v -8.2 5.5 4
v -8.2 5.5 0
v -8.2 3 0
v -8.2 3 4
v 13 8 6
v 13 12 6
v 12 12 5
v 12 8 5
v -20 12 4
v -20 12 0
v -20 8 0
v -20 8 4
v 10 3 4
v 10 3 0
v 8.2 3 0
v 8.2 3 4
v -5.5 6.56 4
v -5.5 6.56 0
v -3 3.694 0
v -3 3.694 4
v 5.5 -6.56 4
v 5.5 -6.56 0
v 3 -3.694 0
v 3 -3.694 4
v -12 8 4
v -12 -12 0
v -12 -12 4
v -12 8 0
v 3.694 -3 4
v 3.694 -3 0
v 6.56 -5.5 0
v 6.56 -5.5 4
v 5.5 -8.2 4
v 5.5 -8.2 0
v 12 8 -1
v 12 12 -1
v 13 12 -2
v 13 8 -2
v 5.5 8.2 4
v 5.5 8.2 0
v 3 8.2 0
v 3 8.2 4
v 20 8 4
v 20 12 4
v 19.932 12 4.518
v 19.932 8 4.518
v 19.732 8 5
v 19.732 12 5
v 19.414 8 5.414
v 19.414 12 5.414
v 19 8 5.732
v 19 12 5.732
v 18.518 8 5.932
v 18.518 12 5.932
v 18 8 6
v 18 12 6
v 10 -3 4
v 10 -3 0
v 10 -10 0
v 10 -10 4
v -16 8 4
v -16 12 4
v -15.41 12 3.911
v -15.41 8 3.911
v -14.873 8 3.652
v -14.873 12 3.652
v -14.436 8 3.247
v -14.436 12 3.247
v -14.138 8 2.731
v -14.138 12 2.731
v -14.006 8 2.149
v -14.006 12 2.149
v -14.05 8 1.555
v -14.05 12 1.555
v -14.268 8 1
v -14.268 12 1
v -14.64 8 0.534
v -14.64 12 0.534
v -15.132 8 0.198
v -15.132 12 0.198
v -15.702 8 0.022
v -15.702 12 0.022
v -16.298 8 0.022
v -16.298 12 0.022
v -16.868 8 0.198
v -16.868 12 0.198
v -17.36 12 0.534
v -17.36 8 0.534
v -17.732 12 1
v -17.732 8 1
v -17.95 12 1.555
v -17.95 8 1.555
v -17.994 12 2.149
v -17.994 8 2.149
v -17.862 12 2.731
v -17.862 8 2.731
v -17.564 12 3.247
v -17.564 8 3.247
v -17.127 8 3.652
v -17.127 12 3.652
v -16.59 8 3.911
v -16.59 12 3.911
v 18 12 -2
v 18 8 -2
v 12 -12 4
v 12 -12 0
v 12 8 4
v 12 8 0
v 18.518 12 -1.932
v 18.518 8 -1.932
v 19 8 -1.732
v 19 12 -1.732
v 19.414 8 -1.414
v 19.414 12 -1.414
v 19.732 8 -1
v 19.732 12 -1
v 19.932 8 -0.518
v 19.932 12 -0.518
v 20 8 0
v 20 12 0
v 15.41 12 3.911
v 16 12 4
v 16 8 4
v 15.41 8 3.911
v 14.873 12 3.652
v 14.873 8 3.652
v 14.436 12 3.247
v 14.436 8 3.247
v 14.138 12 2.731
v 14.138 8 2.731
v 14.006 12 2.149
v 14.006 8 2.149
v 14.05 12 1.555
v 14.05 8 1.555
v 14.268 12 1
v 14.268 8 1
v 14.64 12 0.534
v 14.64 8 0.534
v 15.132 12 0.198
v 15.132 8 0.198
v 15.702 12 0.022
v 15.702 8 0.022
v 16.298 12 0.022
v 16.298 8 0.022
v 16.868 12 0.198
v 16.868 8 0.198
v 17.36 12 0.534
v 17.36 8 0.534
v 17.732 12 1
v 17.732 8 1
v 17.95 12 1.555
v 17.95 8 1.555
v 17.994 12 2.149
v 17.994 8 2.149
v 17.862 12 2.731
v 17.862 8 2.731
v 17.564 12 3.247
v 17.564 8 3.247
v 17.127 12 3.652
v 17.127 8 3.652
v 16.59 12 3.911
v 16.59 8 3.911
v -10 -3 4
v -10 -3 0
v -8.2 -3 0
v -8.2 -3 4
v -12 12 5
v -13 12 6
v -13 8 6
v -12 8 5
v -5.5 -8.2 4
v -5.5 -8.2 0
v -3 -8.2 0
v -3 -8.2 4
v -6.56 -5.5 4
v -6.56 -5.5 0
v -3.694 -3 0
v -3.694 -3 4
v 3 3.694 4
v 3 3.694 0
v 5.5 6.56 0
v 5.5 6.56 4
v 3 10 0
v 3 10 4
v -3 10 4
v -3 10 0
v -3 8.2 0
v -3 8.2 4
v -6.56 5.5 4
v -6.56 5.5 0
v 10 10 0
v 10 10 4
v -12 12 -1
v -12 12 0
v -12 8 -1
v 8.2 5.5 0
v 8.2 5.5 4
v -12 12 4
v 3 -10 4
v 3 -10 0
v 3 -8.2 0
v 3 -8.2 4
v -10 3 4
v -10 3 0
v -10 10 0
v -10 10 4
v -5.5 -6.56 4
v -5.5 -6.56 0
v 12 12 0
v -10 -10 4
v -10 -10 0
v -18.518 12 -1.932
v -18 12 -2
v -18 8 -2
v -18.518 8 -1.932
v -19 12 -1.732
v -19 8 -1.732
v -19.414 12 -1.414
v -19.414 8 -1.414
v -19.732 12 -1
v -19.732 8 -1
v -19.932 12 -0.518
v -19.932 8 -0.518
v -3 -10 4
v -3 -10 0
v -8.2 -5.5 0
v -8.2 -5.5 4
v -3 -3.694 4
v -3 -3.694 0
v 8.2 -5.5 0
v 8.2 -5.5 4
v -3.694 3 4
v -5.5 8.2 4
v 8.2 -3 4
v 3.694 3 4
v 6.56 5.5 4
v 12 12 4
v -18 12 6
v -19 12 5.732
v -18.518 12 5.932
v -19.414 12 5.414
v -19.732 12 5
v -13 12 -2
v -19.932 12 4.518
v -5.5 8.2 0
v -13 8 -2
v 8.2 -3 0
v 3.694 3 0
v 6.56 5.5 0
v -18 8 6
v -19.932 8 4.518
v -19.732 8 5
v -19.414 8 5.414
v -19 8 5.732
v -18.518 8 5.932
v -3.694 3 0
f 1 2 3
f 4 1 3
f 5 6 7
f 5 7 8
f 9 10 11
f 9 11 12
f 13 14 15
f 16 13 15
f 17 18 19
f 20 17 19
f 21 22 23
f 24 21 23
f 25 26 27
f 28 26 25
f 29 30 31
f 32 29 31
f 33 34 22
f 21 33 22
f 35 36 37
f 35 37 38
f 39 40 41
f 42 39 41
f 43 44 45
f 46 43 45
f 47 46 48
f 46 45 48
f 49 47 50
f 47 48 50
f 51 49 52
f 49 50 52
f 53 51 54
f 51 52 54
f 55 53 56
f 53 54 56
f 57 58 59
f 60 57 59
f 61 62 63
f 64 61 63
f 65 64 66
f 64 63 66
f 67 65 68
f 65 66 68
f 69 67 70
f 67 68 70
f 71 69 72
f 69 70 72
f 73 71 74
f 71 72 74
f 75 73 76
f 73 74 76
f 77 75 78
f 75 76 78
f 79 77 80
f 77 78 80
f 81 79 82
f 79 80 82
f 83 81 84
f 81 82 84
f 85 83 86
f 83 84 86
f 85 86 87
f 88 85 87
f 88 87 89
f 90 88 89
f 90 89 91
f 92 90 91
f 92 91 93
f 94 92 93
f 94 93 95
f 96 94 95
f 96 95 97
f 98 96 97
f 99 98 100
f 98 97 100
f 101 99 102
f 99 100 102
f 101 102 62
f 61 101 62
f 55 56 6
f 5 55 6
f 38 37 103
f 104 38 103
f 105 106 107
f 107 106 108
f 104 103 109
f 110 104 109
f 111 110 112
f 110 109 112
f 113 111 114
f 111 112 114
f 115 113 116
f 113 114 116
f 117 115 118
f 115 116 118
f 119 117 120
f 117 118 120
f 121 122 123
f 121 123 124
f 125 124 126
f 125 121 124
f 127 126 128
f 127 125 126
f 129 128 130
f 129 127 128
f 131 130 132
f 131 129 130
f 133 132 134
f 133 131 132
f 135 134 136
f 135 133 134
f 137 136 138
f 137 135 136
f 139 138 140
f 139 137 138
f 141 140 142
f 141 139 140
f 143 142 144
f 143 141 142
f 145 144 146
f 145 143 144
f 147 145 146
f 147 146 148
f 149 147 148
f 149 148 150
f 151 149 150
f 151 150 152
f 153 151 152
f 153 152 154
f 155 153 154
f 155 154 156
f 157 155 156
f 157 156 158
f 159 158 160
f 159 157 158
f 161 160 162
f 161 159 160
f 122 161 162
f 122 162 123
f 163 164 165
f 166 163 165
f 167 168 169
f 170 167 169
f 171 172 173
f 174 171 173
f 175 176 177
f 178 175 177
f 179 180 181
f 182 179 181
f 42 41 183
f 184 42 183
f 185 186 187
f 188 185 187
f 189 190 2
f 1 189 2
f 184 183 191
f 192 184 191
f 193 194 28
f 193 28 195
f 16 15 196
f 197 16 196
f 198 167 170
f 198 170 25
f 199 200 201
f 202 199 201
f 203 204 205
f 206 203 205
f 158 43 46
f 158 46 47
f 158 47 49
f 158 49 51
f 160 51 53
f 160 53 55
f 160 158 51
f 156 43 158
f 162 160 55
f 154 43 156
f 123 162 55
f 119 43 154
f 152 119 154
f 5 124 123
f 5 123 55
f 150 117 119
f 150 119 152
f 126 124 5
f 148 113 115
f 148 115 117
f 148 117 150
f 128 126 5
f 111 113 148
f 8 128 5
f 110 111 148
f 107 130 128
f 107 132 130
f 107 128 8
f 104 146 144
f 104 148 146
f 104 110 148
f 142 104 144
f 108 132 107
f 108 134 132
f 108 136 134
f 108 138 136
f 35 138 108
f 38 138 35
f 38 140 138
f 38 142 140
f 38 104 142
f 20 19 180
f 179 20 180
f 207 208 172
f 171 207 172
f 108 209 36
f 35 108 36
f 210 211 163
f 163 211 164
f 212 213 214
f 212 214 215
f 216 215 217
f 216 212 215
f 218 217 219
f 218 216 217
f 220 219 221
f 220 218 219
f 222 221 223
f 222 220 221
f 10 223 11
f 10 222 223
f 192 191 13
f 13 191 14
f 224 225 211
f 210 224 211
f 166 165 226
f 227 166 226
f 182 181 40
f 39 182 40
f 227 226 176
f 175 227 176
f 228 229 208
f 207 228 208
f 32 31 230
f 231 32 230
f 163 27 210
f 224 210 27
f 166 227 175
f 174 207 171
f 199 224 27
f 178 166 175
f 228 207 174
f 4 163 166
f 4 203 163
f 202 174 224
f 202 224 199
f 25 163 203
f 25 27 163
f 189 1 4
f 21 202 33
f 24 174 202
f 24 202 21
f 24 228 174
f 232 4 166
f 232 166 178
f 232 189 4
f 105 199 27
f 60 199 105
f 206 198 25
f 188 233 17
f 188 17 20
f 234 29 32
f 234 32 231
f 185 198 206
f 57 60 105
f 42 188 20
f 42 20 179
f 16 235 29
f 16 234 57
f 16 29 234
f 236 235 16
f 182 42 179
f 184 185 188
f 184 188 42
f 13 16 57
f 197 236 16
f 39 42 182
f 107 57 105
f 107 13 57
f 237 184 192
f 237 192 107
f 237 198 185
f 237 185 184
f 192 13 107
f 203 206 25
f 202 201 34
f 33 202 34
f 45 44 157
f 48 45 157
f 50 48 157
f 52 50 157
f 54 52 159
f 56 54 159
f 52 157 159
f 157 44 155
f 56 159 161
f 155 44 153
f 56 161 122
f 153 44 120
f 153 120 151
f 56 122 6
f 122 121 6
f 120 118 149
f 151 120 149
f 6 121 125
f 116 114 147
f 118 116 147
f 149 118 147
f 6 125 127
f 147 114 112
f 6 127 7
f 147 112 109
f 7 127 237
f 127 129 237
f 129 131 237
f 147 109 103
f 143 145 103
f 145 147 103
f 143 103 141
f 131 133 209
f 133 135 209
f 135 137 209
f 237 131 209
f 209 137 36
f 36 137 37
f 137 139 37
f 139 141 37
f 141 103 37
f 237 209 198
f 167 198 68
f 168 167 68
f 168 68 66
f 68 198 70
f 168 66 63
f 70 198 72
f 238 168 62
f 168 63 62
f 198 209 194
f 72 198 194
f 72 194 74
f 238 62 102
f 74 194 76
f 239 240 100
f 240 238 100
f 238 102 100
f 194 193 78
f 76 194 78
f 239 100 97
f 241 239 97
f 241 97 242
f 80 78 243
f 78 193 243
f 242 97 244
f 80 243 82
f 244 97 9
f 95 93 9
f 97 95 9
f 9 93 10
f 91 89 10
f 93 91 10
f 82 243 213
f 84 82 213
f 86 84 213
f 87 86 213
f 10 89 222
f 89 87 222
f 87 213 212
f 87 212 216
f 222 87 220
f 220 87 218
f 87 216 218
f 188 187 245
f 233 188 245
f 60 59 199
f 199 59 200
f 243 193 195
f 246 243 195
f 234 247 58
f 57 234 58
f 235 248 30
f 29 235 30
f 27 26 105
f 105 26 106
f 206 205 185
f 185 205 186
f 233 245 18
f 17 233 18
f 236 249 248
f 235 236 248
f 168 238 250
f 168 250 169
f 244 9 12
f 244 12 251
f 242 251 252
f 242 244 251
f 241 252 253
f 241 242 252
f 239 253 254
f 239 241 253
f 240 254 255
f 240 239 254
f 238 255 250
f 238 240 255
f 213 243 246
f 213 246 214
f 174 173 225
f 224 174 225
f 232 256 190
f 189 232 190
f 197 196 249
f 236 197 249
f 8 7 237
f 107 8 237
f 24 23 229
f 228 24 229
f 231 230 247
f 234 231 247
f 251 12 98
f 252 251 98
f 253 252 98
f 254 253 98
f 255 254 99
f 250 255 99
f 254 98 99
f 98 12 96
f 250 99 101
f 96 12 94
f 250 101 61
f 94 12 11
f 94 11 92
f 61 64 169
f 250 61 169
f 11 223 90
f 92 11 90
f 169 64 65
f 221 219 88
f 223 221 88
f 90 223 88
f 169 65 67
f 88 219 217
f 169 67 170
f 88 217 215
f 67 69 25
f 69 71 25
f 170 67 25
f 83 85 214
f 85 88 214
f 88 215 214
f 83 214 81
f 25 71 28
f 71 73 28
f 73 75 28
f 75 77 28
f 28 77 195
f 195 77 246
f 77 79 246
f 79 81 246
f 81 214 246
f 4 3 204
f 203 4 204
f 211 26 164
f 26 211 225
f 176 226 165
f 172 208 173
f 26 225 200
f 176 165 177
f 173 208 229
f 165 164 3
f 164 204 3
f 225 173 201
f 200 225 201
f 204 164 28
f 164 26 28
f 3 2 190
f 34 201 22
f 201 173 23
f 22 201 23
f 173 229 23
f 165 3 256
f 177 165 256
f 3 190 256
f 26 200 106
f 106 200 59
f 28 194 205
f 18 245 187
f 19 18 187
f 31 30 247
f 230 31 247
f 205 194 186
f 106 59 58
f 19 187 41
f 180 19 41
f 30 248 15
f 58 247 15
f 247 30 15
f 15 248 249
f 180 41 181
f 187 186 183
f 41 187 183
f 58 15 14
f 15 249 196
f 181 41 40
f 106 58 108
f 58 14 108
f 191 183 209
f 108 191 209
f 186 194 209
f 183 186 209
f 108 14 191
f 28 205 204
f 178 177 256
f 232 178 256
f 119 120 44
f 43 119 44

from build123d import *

# Parameters (mm, degrees)
SKETCH_1_W                 = 24
SKETCH_1_H                 = 24
EXTRUDE_1_DEPTH            = 4
SKETCH_6_R                 = 2
EXTRUDE_2_DEPTH            = 4
CHAMFER_1_SIZE             = 1
CHAMFER_1_OF_MIRROR_1_SIZE = 1


with BuildPart() as part:
    # Эскиз1 → Бобышка-Вытянуть1 (new body)
    # profile 1 of 5: a face of its own
    with BuildSketch(Plane.XY):
        Rectangle(SKETCH_1_W, SKETCH_1_H)
        Polygon((-3, 10), (0, 10), (3, 10), (5.5, 10), (10, 10), (10, 3), (10, -3), (10, -10), (3, -10), (-3, -10), (-10, -10), (-10, -3), (-10, 3), (-10, 10), (-5.5, 10), align=None, mode=Mode.SUBTRACT)
    # profile 2 of 5: a face of its own
    with BuildSketch(Plane.XY):
        Polygon((-3, -10), (3, -10), (3, -8.2), (5.5, -8.2), (5.5, -6.56), (3, -3.693992791), (-3, -3.693992791), (-5.5, -6.56), (-5.5, -8.2), (-3, -8.2), align=None)
    # profile 3 of 5: a face of its own
    with BuildSketch(Plane.XY):
        Polygon((10, -3), (10, 3), (8.2, 3), (8.2, 5.5), (6.56, 5.5), (3.693992791, 3), (3.693992791, -3), (6.56, -5.5), (8.2, -5.5), (8.2, -3), align=None)
    # profile 4 of 5: a face of its own
    with BuildSketch(Plane.XY):
        Polygon((-8.2, 3), (-10, 3), (-10, -3), (-8.2, -3), (-8.2, -5.5), (-6.56, -5.5), (-3.693992791, -3), (-3.693992791, 3), (-6.56, 5.5), (-8.2, 5.5), align=None)
    # profile 5 of 5: a face of its own
    with BuildSketch(Plane.XY):
        Polygon((3, 10), (0, 10), (-3, 10), (-3, 8.2), (-5.5, 8.2), (-5.5, 6.56), (-3, 3.693992791), (3, 3.693992791), (5.5, 6.56), (5.5, 8.2), (3, 8.2), align=None)
    extrude(amount=EXTRUDE_1_DEPTH)

    # Эскиз6 → Бобышка-Вытянуть2 (add)
    with BuildSketch(Plane(origin=(0, 12, 0), x_dir=(1, 0, 0), z_dir=(0, 1, 0))):
        with BuildLine():
            Line((-12, 2), (-18, 2))
            ThreePointArc((-18, 2), (-19.414213562, 1.414213562), (-20, 0))
            Line((-20, 0), (-20, -4))
            ThreePointArc((-20, -4), (-19.414213562, -5.414213562), (-18, -6))
            Line((-18, -6), (-12, -6))
            Line((-12, -6), (-12, 2))
        make_face()
        with Locations(Location((-16, -2, 0), (0, 0, 270))):
            Circle(SKETCH_6_R, mode=Mode.SUBTRACT)
    extrude_2 = extrude(amount=-EXTRUDE_2_DEPTH)

    # Фаска1
    chamfer_1_edges = [part.edges().sort_by_distance(p)[0] for p in [
        (-12, 10, -2),
        (-12, 10, 6),
    ]]
    chamfer(chamfer_1_edges, length=CHAMFER_1_SIZE)

    # Зеркальное отражение1: Бобышка-Вытянуть2 across plane
    add(extrude_2.mirror(Plane(origin=(0, 0, 0), x_dir=(0, 0, 1), z_dir=(1, 0, 0))))

    # Фаска1 of Зеркальное отражение1
    chamfer_1_of_mirror_1_edges = [part.edges().sort_by_distance(p)[0] for p in [
        (12, 10, -2),
        (12, 10, 6),
    ]]
    chamfer(chamfer_1_of_mirror_1_edges, length=CHAMFER_1_OF_MIRROR_1_SIZE)


solid = part.part
